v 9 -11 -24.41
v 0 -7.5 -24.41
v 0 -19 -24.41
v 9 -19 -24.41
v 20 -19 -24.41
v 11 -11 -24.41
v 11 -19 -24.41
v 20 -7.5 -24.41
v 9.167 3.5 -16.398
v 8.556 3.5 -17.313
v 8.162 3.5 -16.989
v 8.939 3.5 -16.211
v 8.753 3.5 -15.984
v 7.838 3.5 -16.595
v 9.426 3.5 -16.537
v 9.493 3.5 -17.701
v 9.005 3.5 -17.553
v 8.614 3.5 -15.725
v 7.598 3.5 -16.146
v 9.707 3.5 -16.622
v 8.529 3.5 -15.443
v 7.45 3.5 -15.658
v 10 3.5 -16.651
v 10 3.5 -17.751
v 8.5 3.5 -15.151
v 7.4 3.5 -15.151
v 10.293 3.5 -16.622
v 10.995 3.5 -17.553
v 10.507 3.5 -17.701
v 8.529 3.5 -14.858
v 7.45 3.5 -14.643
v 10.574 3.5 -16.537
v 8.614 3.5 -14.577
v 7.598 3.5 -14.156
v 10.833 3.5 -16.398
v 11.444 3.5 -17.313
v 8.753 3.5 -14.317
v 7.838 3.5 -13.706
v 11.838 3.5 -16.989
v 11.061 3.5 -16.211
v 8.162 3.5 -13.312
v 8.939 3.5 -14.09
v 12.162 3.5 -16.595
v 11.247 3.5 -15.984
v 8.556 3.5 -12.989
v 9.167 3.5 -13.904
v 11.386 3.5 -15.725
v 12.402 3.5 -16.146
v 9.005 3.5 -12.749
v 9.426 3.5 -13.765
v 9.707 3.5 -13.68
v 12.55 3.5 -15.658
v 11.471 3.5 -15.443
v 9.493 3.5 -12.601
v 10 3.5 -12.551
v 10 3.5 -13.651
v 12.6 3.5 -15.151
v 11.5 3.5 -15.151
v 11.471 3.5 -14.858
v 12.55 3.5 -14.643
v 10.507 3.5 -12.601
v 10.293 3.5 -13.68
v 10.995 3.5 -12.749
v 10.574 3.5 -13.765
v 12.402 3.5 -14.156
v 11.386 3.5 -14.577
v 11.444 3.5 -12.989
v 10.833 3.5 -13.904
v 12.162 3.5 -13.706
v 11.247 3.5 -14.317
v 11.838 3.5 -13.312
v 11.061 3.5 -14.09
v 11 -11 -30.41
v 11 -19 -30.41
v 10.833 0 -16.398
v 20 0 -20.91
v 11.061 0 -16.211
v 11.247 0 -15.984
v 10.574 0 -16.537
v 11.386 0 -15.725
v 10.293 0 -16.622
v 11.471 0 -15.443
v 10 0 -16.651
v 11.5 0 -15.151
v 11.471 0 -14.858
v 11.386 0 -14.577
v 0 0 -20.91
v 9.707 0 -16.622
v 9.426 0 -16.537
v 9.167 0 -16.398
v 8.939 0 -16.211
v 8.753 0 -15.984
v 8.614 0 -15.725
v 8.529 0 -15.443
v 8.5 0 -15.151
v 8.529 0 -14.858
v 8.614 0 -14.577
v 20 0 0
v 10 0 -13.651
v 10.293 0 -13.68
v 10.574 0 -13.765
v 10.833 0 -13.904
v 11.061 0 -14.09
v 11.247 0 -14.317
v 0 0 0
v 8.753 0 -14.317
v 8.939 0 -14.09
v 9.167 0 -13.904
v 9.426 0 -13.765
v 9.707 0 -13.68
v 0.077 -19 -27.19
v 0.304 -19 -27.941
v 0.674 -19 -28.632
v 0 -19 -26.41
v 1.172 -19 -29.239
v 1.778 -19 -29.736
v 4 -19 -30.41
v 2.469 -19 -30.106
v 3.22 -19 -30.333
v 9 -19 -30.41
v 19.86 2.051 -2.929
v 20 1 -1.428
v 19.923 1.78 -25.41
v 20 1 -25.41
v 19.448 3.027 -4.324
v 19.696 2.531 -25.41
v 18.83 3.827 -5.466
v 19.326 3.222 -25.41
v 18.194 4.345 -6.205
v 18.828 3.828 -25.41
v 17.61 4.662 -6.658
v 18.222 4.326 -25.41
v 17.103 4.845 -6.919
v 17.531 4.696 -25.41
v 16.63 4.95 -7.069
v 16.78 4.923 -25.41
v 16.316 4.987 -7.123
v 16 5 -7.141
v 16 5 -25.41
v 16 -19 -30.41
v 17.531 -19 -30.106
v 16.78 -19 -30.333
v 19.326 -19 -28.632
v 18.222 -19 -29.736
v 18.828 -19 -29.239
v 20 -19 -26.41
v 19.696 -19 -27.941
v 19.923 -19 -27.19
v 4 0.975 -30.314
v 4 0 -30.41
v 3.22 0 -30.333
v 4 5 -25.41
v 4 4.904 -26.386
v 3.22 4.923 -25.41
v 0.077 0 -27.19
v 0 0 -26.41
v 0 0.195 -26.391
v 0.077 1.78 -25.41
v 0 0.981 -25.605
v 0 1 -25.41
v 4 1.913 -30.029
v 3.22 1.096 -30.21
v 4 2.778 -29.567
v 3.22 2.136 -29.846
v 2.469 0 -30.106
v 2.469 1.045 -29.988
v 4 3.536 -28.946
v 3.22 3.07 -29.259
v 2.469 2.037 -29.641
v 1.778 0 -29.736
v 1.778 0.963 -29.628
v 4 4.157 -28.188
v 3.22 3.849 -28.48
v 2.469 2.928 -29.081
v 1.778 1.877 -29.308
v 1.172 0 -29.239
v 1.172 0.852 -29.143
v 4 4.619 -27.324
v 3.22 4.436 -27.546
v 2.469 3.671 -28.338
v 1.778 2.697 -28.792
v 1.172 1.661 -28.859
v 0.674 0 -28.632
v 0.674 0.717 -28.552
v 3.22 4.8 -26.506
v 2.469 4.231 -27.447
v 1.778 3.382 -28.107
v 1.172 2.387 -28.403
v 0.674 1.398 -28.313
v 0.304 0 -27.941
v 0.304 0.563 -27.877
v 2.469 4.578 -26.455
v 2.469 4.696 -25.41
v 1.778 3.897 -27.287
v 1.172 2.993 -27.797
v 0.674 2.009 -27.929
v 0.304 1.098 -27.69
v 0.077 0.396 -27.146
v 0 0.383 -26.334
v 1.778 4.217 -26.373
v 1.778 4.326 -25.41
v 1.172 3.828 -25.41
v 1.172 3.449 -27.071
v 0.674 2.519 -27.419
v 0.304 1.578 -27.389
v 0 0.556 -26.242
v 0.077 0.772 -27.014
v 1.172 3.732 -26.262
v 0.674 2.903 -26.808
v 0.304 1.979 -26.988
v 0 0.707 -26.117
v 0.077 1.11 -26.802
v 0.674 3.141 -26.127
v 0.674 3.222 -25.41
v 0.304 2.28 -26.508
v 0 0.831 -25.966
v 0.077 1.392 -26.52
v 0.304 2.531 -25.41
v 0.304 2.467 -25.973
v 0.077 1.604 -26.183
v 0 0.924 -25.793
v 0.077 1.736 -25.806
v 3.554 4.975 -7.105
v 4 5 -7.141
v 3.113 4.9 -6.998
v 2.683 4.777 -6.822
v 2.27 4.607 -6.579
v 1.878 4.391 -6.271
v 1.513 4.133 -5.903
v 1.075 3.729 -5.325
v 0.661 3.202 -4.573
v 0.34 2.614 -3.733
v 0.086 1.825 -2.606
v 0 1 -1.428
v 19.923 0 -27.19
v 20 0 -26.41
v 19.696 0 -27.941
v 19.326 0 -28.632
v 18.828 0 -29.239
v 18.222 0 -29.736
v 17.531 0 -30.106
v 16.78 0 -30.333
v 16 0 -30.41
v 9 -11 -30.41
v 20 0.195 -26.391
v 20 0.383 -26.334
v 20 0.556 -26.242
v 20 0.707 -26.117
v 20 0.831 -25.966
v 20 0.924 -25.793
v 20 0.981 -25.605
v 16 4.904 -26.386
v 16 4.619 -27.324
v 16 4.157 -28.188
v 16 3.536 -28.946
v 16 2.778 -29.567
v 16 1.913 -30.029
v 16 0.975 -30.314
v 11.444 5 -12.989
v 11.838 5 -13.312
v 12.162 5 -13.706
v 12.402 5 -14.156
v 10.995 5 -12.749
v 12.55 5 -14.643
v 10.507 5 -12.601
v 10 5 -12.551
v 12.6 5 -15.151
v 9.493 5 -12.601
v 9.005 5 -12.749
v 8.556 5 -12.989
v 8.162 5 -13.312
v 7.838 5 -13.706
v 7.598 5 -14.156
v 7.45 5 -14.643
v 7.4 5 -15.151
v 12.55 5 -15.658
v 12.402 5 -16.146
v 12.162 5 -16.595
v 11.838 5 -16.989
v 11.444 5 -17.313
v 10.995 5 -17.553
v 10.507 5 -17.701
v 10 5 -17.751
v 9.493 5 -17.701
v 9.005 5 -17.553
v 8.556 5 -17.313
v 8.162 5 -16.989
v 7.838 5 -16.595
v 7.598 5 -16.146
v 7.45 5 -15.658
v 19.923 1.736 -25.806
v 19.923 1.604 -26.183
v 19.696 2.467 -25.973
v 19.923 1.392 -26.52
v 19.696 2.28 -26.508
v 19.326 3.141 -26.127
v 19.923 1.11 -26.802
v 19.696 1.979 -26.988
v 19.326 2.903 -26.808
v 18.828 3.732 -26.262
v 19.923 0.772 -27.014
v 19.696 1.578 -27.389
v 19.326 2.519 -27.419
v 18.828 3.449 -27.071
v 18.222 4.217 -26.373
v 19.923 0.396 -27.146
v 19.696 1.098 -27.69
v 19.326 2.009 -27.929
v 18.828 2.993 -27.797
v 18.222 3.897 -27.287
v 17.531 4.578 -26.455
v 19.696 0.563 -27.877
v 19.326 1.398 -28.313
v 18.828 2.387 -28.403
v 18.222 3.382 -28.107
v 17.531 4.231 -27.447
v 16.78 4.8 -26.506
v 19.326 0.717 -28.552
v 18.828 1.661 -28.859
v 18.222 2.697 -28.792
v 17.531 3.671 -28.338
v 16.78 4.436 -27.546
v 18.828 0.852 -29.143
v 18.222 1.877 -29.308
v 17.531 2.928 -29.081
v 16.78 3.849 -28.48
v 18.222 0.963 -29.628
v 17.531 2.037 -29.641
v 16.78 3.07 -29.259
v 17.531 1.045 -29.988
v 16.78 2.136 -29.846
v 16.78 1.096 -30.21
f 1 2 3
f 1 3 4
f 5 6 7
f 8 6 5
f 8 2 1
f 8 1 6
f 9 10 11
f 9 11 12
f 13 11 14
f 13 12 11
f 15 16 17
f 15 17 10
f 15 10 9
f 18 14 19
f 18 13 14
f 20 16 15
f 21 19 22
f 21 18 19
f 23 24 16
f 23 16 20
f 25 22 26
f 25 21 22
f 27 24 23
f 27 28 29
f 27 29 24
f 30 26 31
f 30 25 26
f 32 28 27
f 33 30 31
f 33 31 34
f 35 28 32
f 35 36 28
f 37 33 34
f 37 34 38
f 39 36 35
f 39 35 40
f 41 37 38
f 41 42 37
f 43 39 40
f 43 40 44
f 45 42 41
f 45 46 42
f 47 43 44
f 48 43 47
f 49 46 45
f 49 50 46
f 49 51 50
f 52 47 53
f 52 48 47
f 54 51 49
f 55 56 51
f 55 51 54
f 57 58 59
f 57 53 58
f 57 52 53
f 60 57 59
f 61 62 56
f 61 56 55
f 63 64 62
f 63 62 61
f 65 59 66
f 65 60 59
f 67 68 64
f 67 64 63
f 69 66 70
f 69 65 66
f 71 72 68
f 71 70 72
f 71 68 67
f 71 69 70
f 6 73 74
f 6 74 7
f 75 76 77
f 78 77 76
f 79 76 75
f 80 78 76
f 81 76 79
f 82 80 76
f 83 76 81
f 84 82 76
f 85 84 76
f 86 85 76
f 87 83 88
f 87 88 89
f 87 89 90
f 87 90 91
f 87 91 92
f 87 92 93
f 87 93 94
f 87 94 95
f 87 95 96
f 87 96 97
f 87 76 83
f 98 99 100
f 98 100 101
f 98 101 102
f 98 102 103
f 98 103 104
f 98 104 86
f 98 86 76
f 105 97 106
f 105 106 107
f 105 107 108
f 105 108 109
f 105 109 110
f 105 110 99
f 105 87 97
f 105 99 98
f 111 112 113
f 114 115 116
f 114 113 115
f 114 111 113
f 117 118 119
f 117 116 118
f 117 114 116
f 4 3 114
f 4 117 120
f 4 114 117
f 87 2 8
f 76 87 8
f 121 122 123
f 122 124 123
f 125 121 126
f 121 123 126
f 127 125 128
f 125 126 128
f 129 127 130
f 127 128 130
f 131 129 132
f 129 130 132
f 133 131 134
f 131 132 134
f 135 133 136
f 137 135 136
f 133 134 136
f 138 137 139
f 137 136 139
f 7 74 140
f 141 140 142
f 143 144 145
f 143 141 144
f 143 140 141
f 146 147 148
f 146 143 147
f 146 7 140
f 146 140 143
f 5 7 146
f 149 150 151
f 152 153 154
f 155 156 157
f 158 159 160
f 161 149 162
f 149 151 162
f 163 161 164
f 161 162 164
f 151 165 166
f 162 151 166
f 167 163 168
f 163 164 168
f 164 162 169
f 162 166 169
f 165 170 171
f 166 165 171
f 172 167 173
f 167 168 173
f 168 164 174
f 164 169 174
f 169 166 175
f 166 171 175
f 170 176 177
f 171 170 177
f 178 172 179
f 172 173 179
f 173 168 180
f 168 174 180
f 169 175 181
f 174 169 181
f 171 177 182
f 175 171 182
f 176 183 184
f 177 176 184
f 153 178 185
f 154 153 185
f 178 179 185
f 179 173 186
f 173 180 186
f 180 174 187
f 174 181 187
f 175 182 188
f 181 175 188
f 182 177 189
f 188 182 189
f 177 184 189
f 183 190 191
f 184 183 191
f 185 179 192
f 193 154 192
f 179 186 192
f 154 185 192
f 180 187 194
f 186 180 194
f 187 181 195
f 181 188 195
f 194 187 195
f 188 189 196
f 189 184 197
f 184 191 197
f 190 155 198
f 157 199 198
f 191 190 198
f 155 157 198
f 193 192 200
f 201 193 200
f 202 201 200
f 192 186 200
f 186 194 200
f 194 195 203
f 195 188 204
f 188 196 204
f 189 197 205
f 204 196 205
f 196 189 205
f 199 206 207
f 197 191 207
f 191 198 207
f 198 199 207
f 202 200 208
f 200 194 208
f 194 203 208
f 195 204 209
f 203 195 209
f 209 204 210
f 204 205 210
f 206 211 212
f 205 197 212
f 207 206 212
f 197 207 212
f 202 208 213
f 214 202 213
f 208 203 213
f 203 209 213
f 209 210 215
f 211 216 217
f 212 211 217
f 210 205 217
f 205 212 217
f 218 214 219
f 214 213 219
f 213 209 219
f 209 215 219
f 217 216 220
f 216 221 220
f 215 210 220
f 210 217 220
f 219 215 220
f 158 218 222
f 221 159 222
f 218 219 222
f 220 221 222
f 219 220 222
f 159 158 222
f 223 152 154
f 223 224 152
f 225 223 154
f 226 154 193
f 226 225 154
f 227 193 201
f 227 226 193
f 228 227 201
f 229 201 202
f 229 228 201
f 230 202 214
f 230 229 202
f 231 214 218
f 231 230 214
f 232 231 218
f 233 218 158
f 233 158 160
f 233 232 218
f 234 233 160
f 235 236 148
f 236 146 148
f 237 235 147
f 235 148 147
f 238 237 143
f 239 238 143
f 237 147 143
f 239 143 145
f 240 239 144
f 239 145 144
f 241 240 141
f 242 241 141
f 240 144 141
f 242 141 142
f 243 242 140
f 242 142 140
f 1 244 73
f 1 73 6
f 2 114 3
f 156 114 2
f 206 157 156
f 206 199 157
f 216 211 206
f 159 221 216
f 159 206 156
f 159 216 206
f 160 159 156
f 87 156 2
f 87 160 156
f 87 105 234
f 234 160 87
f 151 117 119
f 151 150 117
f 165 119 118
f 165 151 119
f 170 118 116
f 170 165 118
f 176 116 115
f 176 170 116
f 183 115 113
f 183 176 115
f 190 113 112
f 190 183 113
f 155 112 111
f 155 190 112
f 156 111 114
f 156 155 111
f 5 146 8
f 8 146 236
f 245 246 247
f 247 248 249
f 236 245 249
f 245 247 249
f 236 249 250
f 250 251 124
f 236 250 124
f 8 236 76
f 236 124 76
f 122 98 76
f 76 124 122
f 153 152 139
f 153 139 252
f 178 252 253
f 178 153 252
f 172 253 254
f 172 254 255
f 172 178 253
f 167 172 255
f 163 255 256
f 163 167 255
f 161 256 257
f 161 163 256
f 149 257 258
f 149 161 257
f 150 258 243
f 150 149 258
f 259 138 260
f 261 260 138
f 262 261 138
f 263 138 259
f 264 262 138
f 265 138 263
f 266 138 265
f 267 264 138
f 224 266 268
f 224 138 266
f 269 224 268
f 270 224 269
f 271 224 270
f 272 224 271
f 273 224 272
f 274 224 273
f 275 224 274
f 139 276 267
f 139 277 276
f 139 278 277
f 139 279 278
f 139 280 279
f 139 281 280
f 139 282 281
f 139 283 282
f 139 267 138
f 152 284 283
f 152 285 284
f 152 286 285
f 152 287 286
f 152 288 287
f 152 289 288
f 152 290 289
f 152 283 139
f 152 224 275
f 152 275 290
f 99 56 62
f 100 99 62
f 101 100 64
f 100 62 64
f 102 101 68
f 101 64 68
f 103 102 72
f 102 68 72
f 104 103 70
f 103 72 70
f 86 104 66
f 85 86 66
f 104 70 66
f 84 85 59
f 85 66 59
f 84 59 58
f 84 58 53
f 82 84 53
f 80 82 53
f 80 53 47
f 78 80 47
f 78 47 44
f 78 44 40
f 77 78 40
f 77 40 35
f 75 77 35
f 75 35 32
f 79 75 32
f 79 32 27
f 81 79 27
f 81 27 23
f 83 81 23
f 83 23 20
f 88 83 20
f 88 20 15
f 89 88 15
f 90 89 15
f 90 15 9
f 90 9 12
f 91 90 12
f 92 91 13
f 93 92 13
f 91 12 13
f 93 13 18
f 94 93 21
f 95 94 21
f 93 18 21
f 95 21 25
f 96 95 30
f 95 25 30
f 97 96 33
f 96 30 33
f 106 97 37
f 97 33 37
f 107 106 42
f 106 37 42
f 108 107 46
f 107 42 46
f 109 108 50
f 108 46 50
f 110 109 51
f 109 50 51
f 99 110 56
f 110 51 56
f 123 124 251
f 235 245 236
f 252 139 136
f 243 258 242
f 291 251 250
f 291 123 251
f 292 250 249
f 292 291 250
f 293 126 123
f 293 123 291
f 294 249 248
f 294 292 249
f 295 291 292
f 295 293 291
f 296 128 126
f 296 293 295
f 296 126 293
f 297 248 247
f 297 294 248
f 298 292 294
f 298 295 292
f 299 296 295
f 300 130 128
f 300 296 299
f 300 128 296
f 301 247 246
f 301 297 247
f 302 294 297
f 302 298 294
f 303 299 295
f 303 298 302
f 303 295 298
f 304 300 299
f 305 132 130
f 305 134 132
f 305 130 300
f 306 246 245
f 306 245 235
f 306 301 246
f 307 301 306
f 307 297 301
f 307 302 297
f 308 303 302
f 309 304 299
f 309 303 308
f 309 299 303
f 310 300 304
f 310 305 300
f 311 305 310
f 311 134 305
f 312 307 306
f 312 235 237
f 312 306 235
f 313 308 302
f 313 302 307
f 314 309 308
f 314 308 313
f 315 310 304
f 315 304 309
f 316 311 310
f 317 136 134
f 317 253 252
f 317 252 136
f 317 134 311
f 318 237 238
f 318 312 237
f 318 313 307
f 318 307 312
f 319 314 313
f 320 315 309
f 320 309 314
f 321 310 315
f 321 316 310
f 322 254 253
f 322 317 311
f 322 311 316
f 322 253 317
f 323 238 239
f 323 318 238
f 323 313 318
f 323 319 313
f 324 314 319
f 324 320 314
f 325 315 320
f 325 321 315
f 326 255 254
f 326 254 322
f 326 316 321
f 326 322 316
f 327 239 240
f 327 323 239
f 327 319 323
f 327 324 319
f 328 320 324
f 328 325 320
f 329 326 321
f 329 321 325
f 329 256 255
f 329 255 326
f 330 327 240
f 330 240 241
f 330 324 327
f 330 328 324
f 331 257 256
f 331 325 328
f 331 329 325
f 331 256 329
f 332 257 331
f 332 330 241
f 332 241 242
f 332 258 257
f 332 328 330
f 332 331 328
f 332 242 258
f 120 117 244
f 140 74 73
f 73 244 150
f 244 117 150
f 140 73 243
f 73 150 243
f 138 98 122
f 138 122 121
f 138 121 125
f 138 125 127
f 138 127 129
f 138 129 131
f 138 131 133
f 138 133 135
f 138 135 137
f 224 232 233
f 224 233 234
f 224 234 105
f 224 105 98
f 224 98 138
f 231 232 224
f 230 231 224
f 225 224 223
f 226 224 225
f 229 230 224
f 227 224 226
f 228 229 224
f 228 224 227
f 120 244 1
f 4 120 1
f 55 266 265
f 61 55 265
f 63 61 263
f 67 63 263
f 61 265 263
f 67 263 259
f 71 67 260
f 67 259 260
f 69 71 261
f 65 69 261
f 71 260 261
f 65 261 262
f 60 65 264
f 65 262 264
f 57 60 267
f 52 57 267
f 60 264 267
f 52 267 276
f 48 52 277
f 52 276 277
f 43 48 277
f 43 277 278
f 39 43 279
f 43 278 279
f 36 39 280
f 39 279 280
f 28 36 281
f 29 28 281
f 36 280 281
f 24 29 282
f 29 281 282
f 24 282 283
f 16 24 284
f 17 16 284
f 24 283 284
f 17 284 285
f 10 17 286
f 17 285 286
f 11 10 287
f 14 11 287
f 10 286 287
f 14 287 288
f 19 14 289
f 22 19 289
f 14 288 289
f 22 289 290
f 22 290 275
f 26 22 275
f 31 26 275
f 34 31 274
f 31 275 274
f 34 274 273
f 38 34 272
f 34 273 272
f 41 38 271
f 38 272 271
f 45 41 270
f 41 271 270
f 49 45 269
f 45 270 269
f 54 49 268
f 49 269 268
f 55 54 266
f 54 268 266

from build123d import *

# Parameters (mm, degrees)
BOSS_EXTRUDE1_DEPTH = 20
SKETCH2_W           = 9
SKETCH2_H           = 6
BOSS_EXTRUDE2_DEPTH = 8
CHAMFER1_SIZE       = 3.5
CHAMFER1_SIZE2      = 7.5
SKETCH3_R           = 1.5
CUT_EXTRUDE1_DEPTH  = 44.597859544
SKETCH3_3_R         = 2.6
SKETCH3_3_R_2       = 1.5
CUT_EXTRUDE2_DEPTH  = 1.5
FILLET1_R           = 4


with BuildPart() as part:
    # Sketch1 → Boss-Extrude1 (new body)
    with BuildSketch(Plane(origin=(0, 0, 0), x_dir=(0, 0, -1), z_dir=(1, 0, 0))):
        with BuildLine():
            Line((0, 0), (7.140740034, 5))
            Line((7.140740034, 5), (24.410086433, 5))
            Line((24.410086433, 5), (25.410086433, 5))
            ThreePointArc((25.410086433, 5), (28.945620339, 3.535533906), (30.410086433, 0))
            Line((30.410086433, 0), (30.410086433, -11))
            Line((30.410086433, -11), (24.410086433, -11))
            Line((24.410086433, -11), (24.410086433, 0))
            Line((24.410086433, 0), (0, 0))
        make_face()
    extrude(amount=BOSS_EXTRUDE1_DEPTH)

    # Sketch2 → Boss-Extrude2 (add)
    with BuildSketch(Plane.XZ.offset(11)):
        with Locations((15.5, -27.410086433)):
            Rectangle(SKETCH2_W, SKETCH2_H)
        with Locations((4.5, -27.410086433)):
            Rectangle(SKETCH2_W, SKETCH2_H)
    extrude(amount=BOSS_EXTRUDE2_DEPTH)

    # Chamfer1
    chamfer1_edges = [part.edges().sort_by_distance(p)[0] for p in [
        (10, 0, -24.410086433),
    ]]
    chamfer1_side = [part.faces().sort_by_distance(p)[0] for p in [
        (10, 0, -12.205043216),
    ]]
    chamfer(chamfer1_edges, length=CHAMFER1_SIZE, length2=CHAMFER1_SIZE2, reference=chamfer1_side[0])

    # Sketch3 → Cut-Extrude1 (cut, through all)
    with BuildSketch(Plane(origin=(0, 5, 0), x_dir=(1, 0, 0), z_dir=(0, 1, 0))):
        with Locations((10, 15.150730497)):
            Circle(SKETCH3_R)
    extrude(amount=-CUT_EXTRUDE1_DEPTH, mode=Mode.SUBTRACT)

    # Sketch3<3> → Cut-Extrude2 (cut)
    with BuildSketch(Plane(origin=(0, 5, 0), x_dir=(1, 0, 0), z_dir=(0, 1, 0))):
        with Locations((10, 15.150730497)):
            Circle(SKETCH3_3_R)
        with Locations((10, 15.150730497)):
            Circle(SKETCH3_3_R_2, mode=Mode.SUBTRACT)
    extrude(amount=-CUT_EXTRUDE2_DEPTH, mode=Mode.SUBTRACT)

    # Fillet1
    fillet1_edges = [part.edges().sort_by_distance(p)[0] for p in [
        (0, 5, -16.275413233),
        (0, 3.535533906, -28.945620339),
        (20, 5, -16.275413233),
        (20, 3.535533906, -28.945620339),
        (0, -9.5, -30.410086433),
        (20, -9.5, -30.410086433),
    ]]
    fillet(fillet1_edges, radius=FILLET1_R)


solid = part.part
